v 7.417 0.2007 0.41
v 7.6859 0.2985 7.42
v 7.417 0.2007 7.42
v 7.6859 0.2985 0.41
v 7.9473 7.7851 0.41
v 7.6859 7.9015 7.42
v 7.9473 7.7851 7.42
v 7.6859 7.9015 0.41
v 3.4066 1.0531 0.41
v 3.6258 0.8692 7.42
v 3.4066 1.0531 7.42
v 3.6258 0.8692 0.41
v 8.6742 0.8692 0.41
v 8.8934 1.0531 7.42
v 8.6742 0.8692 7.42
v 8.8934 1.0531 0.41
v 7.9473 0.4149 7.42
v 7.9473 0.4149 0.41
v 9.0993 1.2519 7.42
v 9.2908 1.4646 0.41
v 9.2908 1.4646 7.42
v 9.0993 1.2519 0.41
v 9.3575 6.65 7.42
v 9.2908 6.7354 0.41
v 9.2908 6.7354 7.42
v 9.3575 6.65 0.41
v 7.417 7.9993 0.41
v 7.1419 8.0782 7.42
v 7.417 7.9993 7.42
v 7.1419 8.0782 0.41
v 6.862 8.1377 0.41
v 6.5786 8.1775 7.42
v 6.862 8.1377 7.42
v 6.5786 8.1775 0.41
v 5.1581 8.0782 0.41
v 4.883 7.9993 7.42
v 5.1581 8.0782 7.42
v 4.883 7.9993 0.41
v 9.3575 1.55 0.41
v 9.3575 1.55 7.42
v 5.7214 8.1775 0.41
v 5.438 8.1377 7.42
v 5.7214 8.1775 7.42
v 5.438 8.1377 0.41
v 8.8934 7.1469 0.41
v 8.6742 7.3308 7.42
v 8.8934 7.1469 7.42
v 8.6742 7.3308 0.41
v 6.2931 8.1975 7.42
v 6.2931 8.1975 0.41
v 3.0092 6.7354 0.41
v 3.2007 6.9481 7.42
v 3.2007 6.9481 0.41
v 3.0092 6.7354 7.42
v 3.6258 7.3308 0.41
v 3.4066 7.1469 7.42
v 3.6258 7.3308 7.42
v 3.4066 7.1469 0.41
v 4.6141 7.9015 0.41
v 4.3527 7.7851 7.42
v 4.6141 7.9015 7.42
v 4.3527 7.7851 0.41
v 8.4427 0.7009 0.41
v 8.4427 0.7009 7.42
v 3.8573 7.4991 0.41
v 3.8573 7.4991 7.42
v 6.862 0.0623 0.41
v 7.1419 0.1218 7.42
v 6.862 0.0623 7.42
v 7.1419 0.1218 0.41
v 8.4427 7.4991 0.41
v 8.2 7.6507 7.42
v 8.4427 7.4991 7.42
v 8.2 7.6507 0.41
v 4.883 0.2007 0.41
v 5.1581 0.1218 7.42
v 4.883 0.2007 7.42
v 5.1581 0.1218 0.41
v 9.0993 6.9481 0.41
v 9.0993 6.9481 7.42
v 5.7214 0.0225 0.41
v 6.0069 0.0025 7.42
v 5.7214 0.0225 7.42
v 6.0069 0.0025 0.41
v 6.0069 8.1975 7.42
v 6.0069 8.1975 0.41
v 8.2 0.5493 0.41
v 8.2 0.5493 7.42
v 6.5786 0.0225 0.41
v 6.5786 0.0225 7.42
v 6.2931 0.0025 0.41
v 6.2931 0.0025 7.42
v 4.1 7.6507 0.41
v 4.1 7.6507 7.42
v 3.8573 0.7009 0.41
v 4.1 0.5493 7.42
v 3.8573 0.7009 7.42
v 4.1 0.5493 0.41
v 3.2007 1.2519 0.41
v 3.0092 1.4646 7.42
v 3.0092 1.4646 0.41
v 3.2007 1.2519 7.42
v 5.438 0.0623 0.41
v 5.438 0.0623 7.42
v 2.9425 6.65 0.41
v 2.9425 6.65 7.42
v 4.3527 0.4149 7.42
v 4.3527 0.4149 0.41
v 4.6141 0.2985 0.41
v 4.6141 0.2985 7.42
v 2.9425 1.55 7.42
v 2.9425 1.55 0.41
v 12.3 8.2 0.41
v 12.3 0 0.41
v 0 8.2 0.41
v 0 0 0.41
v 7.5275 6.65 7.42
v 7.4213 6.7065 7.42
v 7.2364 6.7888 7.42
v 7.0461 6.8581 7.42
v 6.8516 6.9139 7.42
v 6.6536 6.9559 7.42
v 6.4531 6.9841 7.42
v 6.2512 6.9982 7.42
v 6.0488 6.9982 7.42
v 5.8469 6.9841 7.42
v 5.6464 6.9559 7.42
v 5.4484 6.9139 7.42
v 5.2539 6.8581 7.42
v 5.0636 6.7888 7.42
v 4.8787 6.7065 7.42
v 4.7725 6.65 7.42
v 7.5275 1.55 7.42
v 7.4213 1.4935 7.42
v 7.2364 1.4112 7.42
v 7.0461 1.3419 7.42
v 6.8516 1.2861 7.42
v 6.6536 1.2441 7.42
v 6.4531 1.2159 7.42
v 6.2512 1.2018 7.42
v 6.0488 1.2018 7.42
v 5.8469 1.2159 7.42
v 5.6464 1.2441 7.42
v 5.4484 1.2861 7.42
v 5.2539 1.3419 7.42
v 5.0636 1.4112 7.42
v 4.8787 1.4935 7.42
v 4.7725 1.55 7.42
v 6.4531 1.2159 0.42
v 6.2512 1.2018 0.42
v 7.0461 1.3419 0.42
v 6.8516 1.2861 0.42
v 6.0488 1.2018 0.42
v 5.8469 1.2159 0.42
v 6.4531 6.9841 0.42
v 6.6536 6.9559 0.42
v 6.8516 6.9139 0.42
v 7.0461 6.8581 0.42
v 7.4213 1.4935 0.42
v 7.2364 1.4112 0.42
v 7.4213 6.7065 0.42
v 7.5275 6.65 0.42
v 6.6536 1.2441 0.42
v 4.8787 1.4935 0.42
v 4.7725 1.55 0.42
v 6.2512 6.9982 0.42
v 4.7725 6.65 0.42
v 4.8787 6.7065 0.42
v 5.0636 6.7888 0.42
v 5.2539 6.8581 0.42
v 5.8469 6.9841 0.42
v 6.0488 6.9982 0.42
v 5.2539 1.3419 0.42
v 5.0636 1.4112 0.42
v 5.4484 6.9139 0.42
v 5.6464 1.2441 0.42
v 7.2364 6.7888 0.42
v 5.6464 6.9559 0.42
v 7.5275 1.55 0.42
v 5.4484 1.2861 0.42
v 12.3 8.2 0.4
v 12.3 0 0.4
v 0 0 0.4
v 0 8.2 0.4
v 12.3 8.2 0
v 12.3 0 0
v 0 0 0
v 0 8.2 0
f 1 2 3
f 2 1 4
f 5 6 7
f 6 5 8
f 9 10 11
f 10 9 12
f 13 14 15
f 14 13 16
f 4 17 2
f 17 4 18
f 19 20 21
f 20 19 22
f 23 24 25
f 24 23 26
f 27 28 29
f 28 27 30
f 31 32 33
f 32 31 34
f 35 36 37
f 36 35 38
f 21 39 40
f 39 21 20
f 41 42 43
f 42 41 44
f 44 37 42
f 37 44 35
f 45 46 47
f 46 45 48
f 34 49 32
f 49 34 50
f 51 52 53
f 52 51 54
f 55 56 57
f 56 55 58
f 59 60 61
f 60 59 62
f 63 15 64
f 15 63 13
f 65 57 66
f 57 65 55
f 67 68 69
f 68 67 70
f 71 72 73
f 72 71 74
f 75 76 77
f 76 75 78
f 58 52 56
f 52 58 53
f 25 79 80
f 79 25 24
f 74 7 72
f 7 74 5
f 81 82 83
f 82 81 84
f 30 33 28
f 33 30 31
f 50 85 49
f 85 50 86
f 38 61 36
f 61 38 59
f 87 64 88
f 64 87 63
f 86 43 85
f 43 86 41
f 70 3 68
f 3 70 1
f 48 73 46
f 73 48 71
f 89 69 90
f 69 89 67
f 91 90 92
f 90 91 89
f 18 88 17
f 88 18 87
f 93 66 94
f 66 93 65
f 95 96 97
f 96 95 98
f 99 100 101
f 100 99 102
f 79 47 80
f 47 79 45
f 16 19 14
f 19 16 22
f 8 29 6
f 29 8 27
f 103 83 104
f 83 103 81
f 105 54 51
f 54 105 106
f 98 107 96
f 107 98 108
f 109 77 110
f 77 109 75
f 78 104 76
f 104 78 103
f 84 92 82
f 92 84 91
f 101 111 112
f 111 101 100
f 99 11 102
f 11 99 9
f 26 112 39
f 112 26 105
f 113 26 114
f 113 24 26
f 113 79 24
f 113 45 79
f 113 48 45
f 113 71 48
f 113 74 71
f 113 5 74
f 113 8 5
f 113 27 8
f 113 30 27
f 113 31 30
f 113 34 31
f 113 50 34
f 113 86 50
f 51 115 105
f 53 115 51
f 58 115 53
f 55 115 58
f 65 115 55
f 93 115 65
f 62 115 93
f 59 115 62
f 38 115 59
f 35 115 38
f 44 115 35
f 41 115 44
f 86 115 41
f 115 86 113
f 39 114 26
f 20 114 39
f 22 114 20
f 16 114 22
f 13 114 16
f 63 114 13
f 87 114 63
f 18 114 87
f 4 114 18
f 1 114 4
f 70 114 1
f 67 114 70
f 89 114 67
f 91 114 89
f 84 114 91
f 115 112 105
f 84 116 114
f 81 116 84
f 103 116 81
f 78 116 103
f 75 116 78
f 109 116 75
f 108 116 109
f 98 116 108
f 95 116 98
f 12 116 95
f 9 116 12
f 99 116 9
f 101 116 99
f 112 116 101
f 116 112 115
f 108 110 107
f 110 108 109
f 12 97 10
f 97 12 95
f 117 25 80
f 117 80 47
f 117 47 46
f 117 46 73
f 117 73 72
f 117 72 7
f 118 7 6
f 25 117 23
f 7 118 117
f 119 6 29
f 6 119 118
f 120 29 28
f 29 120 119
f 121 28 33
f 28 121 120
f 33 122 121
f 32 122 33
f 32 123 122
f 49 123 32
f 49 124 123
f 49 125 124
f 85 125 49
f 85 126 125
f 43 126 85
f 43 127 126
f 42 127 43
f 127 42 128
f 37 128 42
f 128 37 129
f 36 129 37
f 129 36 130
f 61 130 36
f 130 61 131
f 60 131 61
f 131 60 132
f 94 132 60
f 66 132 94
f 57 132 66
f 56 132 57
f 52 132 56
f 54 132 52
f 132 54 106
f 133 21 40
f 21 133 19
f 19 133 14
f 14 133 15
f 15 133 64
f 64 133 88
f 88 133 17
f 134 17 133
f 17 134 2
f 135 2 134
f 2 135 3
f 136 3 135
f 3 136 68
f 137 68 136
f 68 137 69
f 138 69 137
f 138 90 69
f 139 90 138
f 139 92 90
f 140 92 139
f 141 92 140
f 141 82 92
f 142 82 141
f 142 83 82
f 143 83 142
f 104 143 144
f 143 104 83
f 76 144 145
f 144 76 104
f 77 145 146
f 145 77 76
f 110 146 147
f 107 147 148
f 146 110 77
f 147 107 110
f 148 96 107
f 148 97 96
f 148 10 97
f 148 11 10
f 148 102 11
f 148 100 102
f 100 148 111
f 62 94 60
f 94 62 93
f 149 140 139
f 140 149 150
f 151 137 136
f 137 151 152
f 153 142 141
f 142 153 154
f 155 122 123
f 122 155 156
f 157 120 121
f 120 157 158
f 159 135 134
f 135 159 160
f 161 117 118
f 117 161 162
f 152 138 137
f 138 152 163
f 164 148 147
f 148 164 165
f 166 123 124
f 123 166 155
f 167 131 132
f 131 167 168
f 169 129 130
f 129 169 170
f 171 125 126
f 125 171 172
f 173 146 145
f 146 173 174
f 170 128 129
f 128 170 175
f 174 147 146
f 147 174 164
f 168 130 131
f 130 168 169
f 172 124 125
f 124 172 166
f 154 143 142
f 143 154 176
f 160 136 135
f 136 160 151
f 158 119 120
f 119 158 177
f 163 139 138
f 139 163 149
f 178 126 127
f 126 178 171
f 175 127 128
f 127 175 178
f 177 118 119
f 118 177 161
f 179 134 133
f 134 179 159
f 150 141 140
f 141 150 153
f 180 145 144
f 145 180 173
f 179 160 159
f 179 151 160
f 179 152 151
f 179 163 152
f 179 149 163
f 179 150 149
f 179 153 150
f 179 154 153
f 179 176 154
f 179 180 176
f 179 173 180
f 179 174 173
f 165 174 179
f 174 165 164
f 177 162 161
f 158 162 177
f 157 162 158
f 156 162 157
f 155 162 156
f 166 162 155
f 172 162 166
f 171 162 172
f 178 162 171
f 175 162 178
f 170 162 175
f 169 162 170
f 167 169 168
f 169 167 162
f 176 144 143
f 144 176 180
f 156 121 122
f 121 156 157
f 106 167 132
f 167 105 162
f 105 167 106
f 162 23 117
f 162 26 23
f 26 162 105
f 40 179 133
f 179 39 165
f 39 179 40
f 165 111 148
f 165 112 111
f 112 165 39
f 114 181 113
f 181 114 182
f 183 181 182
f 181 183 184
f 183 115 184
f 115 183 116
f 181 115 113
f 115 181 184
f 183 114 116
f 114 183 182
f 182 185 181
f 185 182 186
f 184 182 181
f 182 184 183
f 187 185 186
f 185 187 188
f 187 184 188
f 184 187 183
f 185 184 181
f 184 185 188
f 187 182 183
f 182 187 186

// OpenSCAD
// file: ../../Base/PlacementOptions.scad
// Fischertechnik Box Foundation
// Placement Options

// Alignment
NoAlign = 0;
AlignLeft = 1;
AlignBottom = 2;
AlignCenter = 3;
AlignRight = 4;
AlignTop = 5;

// Element rotation degree steps
rotations = [0, -90, -180, -270];

// Rotation
NoRotation = 0;
Rotate0 = 0;
Rotate90 = 1;
Rotate180 = 2;
Rotate270 = 3;

// Docking (seen from above)
NoDock = -1;
DockLeft = 0;
DockTop = 1;
DockRight = 2;
DockCorner = 2;
DockBottom = 3;

// Web corners
LowerLeft = 0;
UpperLeft = 1;
UpperRight = 2;
LowerRight = 3;

// Web position relative to corner
LeftOfCorner = 0;
RightOfCorner = 1;
// file: ../../Base/Boxes.scad
// Fischertechnik Box Foundation
// Pre-designed Boxes

use <Constants.scad>

include <PlacementOptions.scad>

box190Width = 190;
box190Depth = 130;
box130Width = 130;
box130Depth = 95;
boxUsageHeight = 33.9;
boxWallThickness = 2.4;
boxBaseThickness = 1.0;
boxWebWidth = 3.0;

// getBoxWallThickness()
// Gets the wall thickness of a Fischertechnik Box

function getBoxWallThickness() = boxWallThickness;

// Gets the usable height of a fischertechnik box
function getBoxUsageHeight() = boxUsageHeight;

// Gets the thickness of the Fischertechnik box base.
function getBoxBaseThickness() = boxBaseThickness;

// Gets the width of a box web
function getBoxWebWidth() = boxWebWidth;

// Gets the usable inner space of a Box 190 as an x/y-list
function getBox190Space() = [
    box190Width - 2*getBoxWallThickness(), 
    box190Depth - 2*getBoxWallThickness() ];

// Imports the Fischertechnik empty box 130x190 mm and places it at position 0,0
// 190x130 are the outer sizes, the inner space is slightly smaller. Use getBox190Space() to get the inner sizes.
// This module needs the STL file "Fischertechnik Box 130x190.stl" in the library path.
// The box is positioned that the usable inner space is at the 0,0,0 position. The

module Box190() {
    translate([-getBoxWallThickness(),-getBoxWallThickness(),-getBoxBaseThickness()])
        import("Fischertechnik Box 130x190.stl", convexity=3);
}

// Gets the usable inner space of a Box 130 as an x/y-list
function getBox130Space() = [
    box130Width - 2*getBoxWallThickness(), 
    box130Depth - 2*getBoxWallThickness() ];

// Imports the Fischertechnik empty box 95x130 mm and places it at position 0,0
// 190x130 are the outer sizes, the inner space is slightly smaller. Use getBox190Space() to get the inner sizes.
// This module needs the STL file "Fischertechnik Box 95x130.stl" in the library path.
// The box is positioned that the usable inner space is at the 0,0,0 position. The

module Box130() {
    translate([-getBoxWallThickness(),-getBoxWallThickness(),-getBoxBaseThickness()])
        import("Fischertechnik Box 95x130.stl", convexity=3);
}

// Creates a web at the specified box walls
// corner 0 = LowerLeft, 1 = UpperLeft, 2 = UpperRight, 3 = LowerRight
// side 0 = LeftOfCorner, 1 = RightOfCorner
// distance = Distance in mm from the corner
// box = inner width and depth of the box (default: Box 190)
// webWidth = length of the web (default is 3 mms)
// webThickness = thickness of the web (default is 1 mm)

module BoxWeb(corner, side, distance, box=getBox190Space(), webWidth=getBoxWebWidth(), webThickness=1.0) {
    sink = getBoxWallThickness()/2;

    width = (corner % 2 == 0) ? 
            (side == LeftOfCorner ? webWidth : webThickness) :
            (side == LeftOfCorner ? webThickness : webWidth);

    depth = (corner % 2 == 0) ? 
            (side == RightOfCorner ? webWidth : webThickness) :
            (side == RightOfCorner ? webThickness : webWidth);
    
    xDiff = corner == LowerLeft ? 
                (side == LeftOfCorner ? -sink : distance) :
            (corner == UpperLeft ?                
                (side == LeftOfCorner ? distance : -sink) :
            (corner == UpperRight ?
                (side == LeftOfCorner ? box.x-webWidth+sink : box.x-distance-webThickness) :
                (side == LeftOfCorner ? box.x-distance-webThickness: box.x-webWidth+sink)));

    yDiff = corner == LowerLeft ? 
                (side == RightOfCorner ? -sink : distance) :
            (corner == UpperLeft ?
                (side == RightOfCorner ? box.y-distance : box.y-webWidth+sink) :
            (corner == UpperRight ?
                (side == RightOfCorner ? box.y-webWidth+sink : box.y-distance) :
                (side == RightOfCorner ? distance : -sink)));
    
    translate([xDiff, yDiff, -getExcess()])
        cube([width, depth, boxUsageHeight + 2*getExcess()]);
}
// file: ../../Base/Rotation.scad
// Fischertechnik Box Foundation
// Geometry Helpers Rotation

include <PlacementOptions.scad>

// getRotatedSpace(space, rotation=NoRotation)
// Rotates the space dependent on the specified rotation

function getRotatedSpace(space, rotation=NoRotation) = [
    (rotation == Rotate90 || rotation == Rotate270) ? space.y : space.x,
    (rotation == Rotate90 || rotation == Rotate270) ? space.x : space.y
];

// Rotates the given space around the fixed left lower corner
// space = the space the children needs as width/depth list [width,depth]
// rotation = 0 Rotate0 degrees, 1 Rotate90 degrees, 2 Rotate180 degrees, 3 Rotate270 degrees (equivalent to -90)

module RotateFix(space, rotation=Rotate0) {
    dy = (rotation == Rotate0 || rotation == Rotate270) ? 0 :
        (rotation == Rotate90) ? space.x :
        space.y;
    dx = (rotation < Rotate180) ? 0 :
        (rotation == Rotate180) ? space.x :
        space.y;
    
    translate([dx, dy, 0])
        rotate([0, 0, rotations[rotation]])
            children();
}
// file: ../../Base/Alignment.scad
// Fischertechnik Box Foundation
// Geometry Helpers Alignment

include <PlacementOptions.scad>

// getAlignedX(elementWidth, spaceWidth, align=AlignRight, offset=0)
// Gets the aligned X offset of an element with the given
// width in the given space.
// elementWidth = The width of the element to positon
// spaceWidth = The space where the element should be aligned
// align = 0 AlignLeft, 1 AlignCenter, 2 AlignRight
// offset = an optional offset from the aligned position. When
// aligned left or centered, then positive values are in X direction.
// When aligned right then positive values are in negative X direction.

function getAlignedX(elementWidth, spaceWidth, align=AlignRight, offset=0) =
    (align == AlignLeft) ?
        offset :
        ((align == AlignCenter) ?
        (spaceWidth - elementWidth)/2 + offset :
        spaceWidth - offset - elementWidth);

// getAlignedY(elementDepth, spaceDepth, align=AlignTop, offset=0)
// Gets the aligned Y offset of an element with the given
// depth in the given space.
// elementDepth = The depth of the element to positon
// spaceDepth = The space where the element should be aligned
// align = 0 AlignBottom, 1 AlignCenter, 2 AlignTop
// offset = an optional offset from the aligned position. When
// aligned bottom or centered, then positive values are in Y direction.
// When aligned top then positive values are in negative Y direction.

function getAlignedY(elementDepth, spaceDepth, align=AlignTop, offset=0) =
    (align == AlignBottom) ?
        offset :
        ((align == AlignCenter) ?
        (spaceDepth - elementDepth)/2 + offset :
        spaceDepth - offset - elementDepth);
// file: ../../Base/Placement.scad
// Fischertechnik Box Foundation
// Geometry Helpers Placement

use <Constants.scad>
use <Alignment.scad>
use <Rotation.scad>
use <Boxes.scad>

include <PlacementOptions.scad>

// Place(x=0, y=0, elementSpace=[0,0], alignX=AlignLeft, alignY=AlignBottom, rotation=Rotate0, boxSpace=getBox190Space())
// Places the child at the specified position
// y = Y-Position. This is a relative position when an X aligment is specified.
// x = X-Position. This is a relative position when an Y aligment is specified.
// elementSpace = space of the element to be placed [x,y]
// alignX = -1=NoAlign, 0 AlignLeft, 1 AlignCenter, 3 AlignRight (elementSpace and boxSpace required!)
// alignY = -1=NoAlign, 2 AlignBottom, 1 AlignCenter, 4 AlignTop (elementSpace and boxSpace required!)
// rotation = 0 Rotate0 0 degrees, 1 Rotate90 90 degrees, 
// 2 Rotate180 180 degrees, 3 Rotate270 270 degrees (equivalent to -90)
// boxSpace = Inner space of the box where the placement occurs [x,y] - default is Box 190x130 inner space

module Place(x=0, y=0, elementSpace=[0,0], 
  alignX=AlignLeft, alignY=AlignBottom, 
  rotation=NoRotation, boxSpace=getBox190Space()) {

    module Position(x, y, space, rotation=Rotate0) {
        translate([x, y, 0])
            RotateFix(space, rotation)
                children();
    }

    space = getRotatedSpace(elementSpace, rotation);
    alignedX = getAlignedX(space.x, boxSpace.x, alignX, x);
    alignedY = getAlignedY(space.y, boxSpace.y, alignY, y);
    Position(alignedX, alignedY, elementSpace, rotation)
        children();
}

// Center(space=getBox130Space(), elementSpace=[0,0])
// space = Space where the children is centered. For cylinder use centered=true and no elementSpace.
// elementSpace = space of the element to be centered [x,y]

module Center(space=getBox190Space(), elementSpace=[0,0]) {
    translate([(space.x - elementSpace.x) / 2, (space.y - elementSpace.y) / 2])
        children(0);
}

// CenterHorizontal(width=0, y=0, offset=0, space=getBox130Space())
// space = Space where the children is centered. For cylinder use centered=true and no elementSpace.
// elementSpace = space of the element to be centered [x,y]

module CenterHorizontal(width=0, y=0, offset=0, space=getBox190Space()) {
    translate([(space.x - width) / 2 + offset, y])
        children(0);
}

// CenterVertical(depth=0, x=0, offset=0, space=getBox130Space())
// space = Space where the children is centered. For cylinder use centered=true and no elementSpace.
// elementSpace = space of the element to be centered [x,y]

module CenterVertical(depth=0, x=0, offset=0, space=getBox190Space()) {
    translate([x, (space.y - depth) / 2 + offset])
        children(0);
}
// file: ../../Elements/AxisClip10.scad
// Fischertechnik Box Library
// Axis for clip 10
// 31023

use <../ModelBase/Simple.scad>

width = 12;
depth = 12;
height = 23;

// getAxisClip10Space()
// Gets the space of a frame for a clip 10 with spring ring (mot2)

function getAxisClip10Space() = [width, depth, height];

// AxisClip10()
// Axis for clip 10 with spring ring (mot2)

module AxisClip10() {
    LeveledAxisWithSpace(height, height-10, getAxisClip10Space());
}

// Tests
color("lightgray")
AxisClip10();
// file: ../../Base/Constants.scad
// Fischertechnik Box Foundation
// Constants

// Constant values necessary for multiple elements

// Base constants
dividerThickness = 1.2;
excess = 0.01;
fragments = 90;
tolerance = 0.8;

// Gets the thickness of a divider 
function getDividerThickness() = dividerThickness;

// Gets the excess that is used to merge walls into each other
function getExcess() = excess;

// Gets amount of fragments of a cylinder
function getFragments() = fragments;

// Gets the inner tolerance of a frame to each side
function getTolerance() = tolerance;


// Fischertechnik specific constants
axisDiameter = 4;
axisBottomDiameter = axisDiameter + 1;
standardEdgeDistance = 2.5;
standardWebDistance = 11.5;
standardCornerLength = 15;
tubeWallFactor = 0.8;

// Gets axis diameter
function getAxisDiameter() = axisDiameter;

// Gets axis bottom diameter for thicker part at the bottom
function getAxisBottomDiameter() = axisBottomDiameter;

// gets the standard distance to the wall of the box for dockable frames with webs
function getStandardEdgeDistance() = standardEdgeDistance;

// gets the standard distance of each web to the corner of the dockable frame
function getStandardWebDistance() = standardWebDistance;

// gets the standard length of the corner walls of a dockable frame
function getStandardCornerLength() = standardCornerLength;

// gets the wall thickness of a tube.
function getTubeWallThickness() = tubeWallFactor * getDividerThickness();
// file: ../../Elements/HolderBulbLamp.scad
// Fischertechnik Box Library
// Holder for bulb lamp and lens tip lamp
// 37869, 37875

use <../Base/Constants.scad>
use <../Base/Placement.scad>
use <../ModelBase/Simple.scad>

width = 11.5;
depth = 5.8;

// getHolderBulbLampSpace()
// Gets the space the bulb lamp holder needs as width and depth (.x and .y as a list)

function getHolderBulbLampSpace() = [width + getTolerance(), depth + 2*getDividerThickness()];

// HolderBulbLamp()
// Holder for a bulb lamp.

module HolderBulbLamp() {
    height = 7.0;
    cutoffDepth = 5.1;
    diameter = depth + 2*getDividerThickness();


    Space(getHolderBulbLampSpace());
    
    difference() {
        Center(getHolderBulbLampSpace())
            Tube(height, innerDiameter=depth, outerDiameter=diameter);
        translate([0, (getHolderBulbLampSpace().y-cutoffDepth)/2])
            cube([getHolderBulbLampSpace().x, cutoffDepth, height + 1]);
    }
}


// Tests
color("lightgray") {
HolderBulbLamp();
}
// file: ../TestPrint.scad
// 3D Print Test Base

use <../Base/Constants.scad>

use <../Elements/AxisClip10.scad>

module TestPrint(elementSpace) {
    cube([elementSpace.x, elementSpace.y, 0.4]);
    translate([0,0,0.4+getExcess()]) {
        children();
    }
}

TestPrint(getAxisClip10Space())
    AxisClip10();
// main file
// 3D Print Test Base
// HolderBulbLamp

use <../TestPrint.scad>
use <../../Elements/HolderBulbLamp.scad>

TestPrint(getHolderBulbLampSpace())
    HolderBulbLamp();
